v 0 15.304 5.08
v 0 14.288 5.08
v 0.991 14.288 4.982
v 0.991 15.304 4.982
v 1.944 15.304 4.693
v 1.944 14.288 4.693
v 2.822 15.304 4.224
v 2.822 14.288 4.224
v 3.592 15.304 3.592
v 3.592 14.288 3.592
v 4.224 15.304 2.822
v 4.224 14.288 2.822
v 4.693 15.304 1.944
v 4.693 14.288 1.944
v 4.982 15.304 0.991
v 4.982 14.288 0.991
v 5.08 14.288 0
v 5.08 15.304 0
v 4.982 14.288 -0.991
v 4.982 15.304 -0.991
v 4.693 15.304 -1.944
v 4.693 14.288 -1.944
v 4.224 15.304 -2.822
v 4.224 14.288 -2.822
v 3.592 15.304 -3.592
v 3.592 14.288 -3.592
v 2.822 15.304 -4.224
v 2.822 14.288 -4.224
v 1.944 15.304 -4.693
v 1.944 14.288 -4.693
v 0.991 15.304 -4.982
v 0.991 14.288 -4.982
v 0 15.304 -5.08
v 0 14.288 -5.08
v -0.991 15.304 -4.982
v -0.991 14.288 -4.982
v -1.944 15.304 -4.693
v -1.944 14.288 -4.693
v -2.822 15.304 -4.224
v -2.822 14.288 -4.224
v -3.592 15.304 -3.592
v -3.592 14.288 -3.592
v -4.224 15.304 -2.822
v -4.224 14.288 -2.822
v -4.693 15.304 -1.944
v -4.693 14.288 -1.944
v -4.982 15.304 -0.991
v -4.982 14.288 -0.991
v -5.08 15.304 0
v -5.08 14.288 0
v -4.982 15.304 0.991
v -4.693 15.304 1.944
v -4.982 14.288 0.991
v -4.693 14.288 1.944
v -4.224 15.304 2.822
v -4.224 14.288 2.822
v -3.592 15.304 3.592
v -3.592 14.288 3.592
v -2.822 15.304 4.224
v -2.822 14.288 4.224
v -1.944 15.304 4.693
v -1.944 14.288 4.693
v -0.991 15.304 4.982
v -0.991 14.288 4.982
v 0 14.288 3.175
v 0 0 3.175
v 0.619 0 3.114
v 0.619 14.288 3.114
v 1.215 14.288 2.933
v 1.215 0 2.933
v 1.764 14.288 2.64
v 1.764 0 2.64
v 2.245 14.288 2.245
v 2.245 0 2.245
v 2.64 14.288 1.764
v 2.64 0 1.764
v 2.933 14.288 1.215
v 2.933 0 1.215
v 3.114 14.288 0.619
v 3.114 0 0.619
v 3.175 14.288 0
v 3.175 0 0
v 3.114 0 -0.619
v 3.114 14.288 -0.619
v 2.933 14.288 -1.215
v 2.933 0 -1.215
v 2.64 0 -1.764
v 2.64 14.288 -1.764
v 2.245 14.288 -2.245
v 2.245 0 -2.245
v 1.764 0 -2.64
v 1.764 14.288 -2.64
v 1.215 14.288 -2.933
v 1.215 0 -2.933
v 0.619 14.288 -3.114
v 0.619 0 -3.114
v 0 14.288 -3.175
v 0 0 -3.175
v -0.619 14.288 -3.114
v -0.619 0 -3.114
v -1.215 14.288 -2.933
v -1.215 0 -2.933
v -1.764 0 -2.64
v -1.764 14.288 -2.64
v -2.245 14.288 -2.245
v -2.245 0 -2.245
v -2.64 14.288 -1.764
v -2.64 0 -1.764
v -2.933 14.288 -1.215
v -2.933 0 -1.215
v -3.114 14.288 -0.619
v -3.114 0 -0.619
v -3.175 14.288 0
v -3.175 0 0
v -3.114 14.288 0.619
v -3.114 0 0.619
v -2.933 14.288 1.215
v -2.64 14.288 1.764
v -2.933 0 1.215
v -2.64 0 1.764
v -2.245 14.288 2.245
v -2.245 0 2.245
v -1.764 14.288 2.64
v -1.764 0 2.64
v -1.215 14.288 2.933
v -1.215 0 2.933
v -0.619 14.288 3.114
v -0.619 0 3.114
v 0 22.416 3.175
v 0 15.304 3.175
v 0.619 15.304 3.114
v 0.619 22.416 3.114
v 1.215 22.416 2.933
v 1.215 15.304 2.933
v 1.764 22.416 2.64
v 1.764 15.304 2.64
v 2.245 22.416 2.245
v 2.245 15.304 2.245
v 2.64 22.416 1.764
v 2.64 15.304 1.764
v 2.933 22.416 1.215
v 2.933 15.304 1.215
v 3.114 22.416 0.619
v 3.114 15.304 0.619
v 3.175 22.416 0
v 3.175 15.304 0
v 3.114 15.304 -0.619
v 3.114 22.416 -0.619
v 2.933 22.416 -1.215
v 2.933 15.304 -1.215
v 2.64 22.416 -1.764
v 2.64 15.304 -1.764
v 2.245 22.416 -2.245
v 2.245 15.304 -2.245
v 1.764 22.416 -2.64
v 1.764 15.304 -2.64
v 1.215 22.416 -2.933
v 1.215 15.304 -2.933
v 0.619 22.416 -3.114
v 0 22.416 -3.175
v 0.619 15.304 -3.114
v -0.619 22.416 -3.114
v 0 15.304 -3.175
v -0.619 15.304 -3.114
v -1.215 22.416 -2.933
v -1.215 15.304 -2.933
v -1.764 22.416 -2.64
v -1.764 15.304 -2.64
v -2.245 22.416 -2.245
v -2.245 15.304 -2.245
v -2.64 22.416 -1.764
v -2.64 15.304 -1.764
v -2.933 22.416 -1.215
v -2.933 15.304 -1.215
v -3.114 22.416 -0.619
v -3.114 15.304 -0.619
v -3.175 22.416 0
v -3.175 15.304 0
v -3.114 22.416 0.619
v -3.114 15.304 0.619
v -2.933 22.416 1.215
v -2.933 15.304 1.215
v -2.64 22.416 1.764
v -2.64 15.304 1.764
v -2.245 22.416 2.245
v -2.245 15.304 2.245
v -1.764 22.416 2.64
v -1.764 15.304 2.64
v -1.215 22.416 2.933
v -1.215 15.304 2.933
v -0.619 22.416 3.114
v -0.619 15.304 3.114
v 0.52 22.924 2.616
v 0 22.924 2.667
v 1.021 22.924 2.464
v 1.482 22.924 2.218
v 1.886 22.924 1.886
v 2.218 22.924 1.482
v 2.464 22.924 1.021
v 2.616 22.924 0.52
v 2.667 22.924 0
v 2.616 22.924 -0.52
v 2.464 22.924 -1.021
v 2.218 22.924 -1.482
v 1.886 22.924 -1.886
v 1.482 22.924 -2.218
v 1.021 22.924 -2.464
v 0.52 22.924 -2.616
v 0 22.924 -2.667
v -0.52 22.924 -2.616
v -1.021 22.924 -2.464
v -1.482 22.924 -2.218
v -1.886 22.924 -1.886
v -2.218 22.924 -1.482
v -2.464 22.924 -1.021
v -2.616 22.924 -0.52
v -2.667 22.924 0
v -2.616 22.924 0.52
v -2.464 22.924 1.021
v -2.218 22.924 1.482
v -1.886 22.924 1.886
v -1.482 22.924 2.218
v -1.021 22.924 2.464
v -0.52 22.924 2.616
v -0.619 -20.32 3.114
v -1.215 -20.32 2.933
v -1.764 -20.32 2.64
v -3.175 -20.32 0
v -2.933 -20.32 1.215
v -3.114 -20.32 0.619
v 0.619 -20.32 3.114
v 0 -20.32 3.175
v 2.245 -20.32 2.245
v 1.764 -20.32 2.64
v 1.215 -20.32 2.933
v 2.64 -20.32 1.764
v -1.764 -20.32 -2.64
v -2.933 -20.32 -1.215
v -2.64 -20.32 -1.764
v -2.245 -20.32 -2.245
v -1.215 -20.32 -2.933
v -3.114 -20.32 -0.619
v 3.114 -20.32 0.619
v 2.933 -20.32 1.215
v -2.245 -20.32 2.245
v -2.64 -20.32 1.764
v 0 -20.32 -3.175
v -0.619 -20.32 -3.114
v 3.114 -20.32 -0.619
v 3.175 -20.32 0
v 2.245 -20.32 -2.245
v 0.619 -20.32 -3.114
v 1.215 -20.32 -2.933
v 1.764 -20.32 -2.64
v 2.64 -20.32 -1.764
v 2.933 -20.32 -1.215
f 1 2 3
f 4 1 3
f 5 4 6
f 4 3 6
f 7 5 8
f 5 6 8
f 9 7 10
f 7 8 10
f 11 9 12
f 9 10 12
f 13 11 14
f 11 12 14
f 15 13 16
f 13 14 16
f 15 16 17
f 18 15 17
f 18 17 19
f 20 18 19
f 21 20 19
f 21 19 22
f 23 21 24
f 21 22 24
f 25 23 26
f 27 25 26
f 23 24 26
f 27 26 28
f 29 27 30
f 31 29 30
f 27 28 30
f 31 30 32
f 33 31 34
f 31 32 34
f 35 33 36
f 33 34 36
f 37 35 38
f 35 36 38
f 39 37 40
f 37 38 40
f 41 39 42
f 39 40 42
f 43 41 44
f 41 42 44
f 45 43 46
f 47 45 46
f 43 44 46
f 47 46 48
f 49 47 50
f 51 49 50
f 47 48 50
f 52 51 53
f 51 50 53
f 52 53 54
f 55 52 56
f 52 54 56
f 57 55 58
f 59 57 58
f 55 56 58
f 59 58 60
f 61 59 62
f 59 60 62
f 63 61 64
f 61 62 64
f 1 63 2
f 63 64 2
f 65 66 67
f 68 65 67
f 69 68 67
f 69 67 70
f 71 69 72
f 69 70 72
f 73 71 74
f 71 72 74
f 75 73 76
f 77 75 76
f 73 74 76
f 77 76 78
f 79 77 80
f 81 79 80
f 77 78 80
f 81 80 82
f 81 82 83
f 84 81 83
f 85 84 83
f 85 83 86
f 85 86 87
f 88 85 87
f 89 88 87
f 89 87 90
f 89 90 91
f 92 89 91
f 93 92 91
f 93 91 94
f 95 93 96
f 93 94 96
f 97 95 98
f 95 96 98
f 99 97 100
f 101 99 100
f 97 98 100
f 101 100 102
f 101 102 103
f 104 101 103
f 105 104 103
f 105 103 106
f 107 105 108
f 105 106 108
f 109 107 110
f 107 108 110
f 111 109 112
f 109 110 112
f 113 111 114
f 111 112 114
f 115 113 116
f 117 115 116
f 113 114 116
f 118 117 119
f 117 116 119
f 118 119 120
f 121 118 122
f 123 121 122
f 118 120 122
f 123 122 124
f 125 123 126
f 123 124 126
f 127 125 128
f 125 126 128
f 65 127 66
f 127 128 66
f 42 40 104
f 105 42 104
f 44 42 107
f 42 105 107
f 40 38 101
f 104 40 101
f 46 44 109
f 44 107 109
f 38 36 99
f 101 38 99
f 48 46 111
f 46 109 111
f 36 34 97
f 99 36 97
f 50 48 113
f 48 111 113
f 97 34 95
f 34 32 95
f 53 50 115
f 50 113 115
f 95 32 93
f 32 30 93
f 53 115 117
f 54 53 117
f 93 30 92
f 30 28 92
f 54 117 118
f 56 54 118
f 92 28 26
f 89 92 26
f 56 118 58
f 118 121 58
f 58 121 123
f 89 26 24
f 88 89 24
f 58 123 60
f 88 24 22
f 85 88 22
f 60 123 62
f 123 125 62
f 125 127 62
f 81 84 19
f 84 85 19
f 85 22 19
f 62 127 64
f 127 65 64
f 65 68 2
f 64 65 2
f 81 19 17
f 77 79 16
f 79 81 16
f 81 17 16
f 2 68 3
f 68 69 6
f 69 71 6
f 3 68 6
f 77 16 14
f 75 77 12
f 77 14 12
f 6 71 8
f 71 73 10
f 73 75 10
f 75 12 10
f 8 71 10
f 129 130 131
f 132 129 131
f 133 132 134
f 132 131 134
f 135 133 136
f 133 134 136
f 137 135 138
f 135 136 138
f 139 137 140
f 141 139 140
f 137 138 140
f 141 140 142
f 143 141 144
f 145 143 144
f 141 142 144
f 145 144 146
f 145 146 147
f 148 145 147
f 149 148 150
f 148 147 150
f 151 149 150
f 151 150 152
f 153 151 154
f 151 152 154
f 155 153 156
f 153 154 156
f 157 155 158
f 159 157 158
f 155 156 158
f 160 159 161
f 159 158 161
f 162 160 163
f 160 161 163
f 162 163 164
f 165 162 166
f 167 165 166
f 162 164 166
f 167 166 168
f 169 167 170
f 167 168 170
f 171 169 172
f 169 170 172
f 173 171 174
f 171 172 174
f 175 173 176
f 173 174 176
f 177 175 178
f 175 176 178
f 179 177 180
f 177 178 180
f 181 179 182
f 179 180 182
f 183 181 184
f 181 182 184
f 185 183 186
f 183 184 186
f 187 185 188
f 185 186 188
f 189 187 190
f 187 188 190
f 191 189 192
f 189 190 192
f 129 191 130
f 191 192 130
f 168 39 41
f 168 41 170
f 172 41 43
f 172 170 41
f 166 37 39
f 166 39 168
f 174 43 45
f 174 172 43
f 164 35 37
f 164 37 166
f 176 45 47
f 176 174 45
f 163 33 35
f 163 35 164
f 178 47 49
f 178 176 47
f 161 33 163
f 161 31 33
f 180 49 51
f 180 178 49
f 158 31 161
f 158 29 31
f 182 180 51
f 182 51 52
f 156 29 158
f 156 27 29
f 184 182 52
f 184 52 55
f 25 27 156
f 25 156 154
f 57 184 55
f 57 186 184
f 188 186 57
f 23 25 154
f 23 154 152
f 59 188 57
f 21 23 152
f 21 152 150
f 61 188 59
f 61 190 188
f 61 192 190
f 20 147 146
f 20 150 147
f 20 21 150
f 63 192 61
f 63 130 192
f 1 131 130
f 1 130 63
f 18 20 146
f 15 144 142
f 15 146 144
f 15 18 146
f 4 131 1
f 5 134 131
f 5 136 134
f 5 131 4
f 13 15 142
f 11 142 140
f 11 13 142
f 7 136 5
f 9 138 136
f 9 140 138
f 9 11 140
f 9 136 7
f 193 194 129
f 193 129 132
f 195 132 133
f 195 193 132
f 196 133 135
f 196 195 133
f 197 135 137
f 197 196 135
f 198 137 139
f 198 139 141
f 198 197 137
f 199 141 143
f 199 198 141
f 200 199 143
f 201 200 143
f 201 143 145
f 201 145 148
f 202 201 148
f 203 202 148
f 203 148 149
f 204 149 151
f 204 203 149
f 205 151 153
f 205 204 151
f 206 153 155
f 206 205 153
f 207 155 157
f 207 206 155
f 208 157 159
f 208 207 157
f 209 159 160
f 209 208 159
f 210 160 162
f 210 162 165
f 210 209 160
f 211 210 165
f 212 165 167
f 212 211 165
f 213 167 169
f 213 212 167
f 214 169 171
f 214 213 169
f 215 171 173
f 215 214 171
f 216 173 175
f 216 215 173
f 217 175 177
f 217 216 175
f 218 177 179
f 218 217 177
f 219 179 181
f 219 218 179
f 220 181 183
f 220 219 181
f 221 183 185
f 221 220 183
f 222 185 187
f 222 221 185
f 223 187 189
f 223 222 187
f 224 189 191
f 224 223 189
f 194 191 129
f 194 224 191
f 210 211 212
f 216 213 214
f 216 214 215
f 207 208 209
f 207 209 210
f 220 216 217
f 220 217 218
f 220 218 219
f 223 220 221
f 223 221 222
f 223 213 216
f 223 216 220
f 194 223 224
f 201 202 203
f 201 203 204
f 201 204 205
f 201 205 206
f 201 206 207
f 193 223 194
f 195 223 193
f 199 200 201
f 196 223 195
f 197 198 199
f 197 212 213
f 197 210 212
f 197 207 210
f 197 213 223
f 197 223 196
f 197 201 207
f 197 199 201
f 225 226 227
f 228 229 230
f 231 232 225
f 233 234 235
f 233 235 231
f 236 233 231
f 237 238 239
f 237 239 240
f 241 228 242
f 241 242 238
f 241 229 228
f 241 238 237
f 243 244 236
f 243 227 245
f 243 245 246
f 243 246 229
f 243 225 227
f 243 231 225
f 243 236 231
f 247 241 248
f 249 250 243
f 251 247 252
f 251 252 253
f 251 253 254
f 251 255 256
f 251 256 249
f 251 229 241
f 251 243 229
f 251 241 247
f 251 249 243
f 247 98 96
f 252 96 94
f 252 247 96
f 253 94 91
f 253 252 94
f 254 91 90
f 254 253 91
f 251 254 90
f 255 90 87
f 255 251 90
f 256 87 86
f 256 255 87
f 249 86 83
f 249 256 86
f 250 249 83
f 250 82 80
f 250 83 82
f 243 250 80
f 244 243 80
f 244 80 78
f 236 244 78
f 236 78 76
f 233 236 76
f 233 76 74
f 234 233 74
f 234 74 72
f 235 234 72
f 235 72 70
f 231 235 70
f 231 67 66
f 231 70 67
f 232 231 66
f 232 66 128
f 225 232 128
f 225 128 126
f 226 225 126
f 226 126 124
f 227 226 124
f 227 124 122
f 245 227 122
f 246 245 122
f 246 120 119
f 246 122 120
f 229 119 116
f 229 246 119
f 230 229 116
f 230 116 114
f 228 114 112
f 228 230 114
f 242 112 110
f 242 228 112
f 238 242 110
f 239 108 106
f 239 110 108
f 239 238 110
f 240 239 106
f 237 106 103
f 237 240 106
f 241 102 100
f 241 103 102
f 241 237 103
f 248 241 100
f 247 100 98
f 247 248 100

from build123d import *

# Parameters (mm, degrees)
SKETCH1_R           = 3.175
BOSS_EXTRUDE1_DEPTH = 14.2875
SKETCH3_R           = 5.08
BOSS_EXTRUDE2_DEPTH = 1.016
SKETCH4_R           = 3.175
BOSS_EXTRUDE3_DEPTH = 7.62
CHAMFER2_SIZE       = 0.508
BOSS_EXTRUDE4_START = 20.32
SKETCH9_R           = 3.175
BOSS_EXTRUDE4_DEPTH = 20.32


with BuildPart() as part:
    # Sketch1 → Boss-Extrude1 (new body)
    with BuildSketch(Plane(origin=(0, 0, 0), x_dir=(1, 0, 0), z_dir=(0, 1, 0))):
        with Locations(Location((0, 0, 0), (0, 0, 270))):
            Circle(SKETCH1_R)
    extrude(amount=BOSS_EXTRUDE1_DEPTH)

    # Sketch3 → Boss-Extrude2 (add)
    with BuildSketch(Plane(origin=(0, 14.2875, 0), x_dir=(1, 0, 0), z_dir=(0, 1, 0))):
        with Locations(Location((0, 0, 0), (0, 0, 270))):
            Circle(SKETCH3_R)
    extrude(amount=BOSS_EXTRUDE2_DEPTH)

    # Sketch4 → Boss-Extrude3 (add)
    with BuildSketch(Plane(origin=(0, 15.3035, 0), x_dir=(1, 0, 0), z_dir=(0, 1, 0))):
        with Locations(Location((0, 0, 0), (0, 0, 270))):
            Circle(SKETCH4_R)
    extrude(amount=BOSS_EXTRUDE3_DEPTH)

    # Chamfer2
    chamfer2_edges = [part.edges().sort_by_distance(p)[0] for p in [
        (0, 22.9235, -3.175),
    ]]
    chamfer(chamfer2_edges, length=CHAMFER2_SIZE)

    # Sketch9 → Boss-Extrude4 (add)
    with BuildSketch(Plane.XZ.offset(BOSS_EXTRUDE4_START)):
        with Locations(Location((0, 0, 0), (0, 0, 270))):
            Circle(SKETCH9_R)
    extrude(amount=-BOSS_EXTRUDE4_DEPTH)


solid = part.part
